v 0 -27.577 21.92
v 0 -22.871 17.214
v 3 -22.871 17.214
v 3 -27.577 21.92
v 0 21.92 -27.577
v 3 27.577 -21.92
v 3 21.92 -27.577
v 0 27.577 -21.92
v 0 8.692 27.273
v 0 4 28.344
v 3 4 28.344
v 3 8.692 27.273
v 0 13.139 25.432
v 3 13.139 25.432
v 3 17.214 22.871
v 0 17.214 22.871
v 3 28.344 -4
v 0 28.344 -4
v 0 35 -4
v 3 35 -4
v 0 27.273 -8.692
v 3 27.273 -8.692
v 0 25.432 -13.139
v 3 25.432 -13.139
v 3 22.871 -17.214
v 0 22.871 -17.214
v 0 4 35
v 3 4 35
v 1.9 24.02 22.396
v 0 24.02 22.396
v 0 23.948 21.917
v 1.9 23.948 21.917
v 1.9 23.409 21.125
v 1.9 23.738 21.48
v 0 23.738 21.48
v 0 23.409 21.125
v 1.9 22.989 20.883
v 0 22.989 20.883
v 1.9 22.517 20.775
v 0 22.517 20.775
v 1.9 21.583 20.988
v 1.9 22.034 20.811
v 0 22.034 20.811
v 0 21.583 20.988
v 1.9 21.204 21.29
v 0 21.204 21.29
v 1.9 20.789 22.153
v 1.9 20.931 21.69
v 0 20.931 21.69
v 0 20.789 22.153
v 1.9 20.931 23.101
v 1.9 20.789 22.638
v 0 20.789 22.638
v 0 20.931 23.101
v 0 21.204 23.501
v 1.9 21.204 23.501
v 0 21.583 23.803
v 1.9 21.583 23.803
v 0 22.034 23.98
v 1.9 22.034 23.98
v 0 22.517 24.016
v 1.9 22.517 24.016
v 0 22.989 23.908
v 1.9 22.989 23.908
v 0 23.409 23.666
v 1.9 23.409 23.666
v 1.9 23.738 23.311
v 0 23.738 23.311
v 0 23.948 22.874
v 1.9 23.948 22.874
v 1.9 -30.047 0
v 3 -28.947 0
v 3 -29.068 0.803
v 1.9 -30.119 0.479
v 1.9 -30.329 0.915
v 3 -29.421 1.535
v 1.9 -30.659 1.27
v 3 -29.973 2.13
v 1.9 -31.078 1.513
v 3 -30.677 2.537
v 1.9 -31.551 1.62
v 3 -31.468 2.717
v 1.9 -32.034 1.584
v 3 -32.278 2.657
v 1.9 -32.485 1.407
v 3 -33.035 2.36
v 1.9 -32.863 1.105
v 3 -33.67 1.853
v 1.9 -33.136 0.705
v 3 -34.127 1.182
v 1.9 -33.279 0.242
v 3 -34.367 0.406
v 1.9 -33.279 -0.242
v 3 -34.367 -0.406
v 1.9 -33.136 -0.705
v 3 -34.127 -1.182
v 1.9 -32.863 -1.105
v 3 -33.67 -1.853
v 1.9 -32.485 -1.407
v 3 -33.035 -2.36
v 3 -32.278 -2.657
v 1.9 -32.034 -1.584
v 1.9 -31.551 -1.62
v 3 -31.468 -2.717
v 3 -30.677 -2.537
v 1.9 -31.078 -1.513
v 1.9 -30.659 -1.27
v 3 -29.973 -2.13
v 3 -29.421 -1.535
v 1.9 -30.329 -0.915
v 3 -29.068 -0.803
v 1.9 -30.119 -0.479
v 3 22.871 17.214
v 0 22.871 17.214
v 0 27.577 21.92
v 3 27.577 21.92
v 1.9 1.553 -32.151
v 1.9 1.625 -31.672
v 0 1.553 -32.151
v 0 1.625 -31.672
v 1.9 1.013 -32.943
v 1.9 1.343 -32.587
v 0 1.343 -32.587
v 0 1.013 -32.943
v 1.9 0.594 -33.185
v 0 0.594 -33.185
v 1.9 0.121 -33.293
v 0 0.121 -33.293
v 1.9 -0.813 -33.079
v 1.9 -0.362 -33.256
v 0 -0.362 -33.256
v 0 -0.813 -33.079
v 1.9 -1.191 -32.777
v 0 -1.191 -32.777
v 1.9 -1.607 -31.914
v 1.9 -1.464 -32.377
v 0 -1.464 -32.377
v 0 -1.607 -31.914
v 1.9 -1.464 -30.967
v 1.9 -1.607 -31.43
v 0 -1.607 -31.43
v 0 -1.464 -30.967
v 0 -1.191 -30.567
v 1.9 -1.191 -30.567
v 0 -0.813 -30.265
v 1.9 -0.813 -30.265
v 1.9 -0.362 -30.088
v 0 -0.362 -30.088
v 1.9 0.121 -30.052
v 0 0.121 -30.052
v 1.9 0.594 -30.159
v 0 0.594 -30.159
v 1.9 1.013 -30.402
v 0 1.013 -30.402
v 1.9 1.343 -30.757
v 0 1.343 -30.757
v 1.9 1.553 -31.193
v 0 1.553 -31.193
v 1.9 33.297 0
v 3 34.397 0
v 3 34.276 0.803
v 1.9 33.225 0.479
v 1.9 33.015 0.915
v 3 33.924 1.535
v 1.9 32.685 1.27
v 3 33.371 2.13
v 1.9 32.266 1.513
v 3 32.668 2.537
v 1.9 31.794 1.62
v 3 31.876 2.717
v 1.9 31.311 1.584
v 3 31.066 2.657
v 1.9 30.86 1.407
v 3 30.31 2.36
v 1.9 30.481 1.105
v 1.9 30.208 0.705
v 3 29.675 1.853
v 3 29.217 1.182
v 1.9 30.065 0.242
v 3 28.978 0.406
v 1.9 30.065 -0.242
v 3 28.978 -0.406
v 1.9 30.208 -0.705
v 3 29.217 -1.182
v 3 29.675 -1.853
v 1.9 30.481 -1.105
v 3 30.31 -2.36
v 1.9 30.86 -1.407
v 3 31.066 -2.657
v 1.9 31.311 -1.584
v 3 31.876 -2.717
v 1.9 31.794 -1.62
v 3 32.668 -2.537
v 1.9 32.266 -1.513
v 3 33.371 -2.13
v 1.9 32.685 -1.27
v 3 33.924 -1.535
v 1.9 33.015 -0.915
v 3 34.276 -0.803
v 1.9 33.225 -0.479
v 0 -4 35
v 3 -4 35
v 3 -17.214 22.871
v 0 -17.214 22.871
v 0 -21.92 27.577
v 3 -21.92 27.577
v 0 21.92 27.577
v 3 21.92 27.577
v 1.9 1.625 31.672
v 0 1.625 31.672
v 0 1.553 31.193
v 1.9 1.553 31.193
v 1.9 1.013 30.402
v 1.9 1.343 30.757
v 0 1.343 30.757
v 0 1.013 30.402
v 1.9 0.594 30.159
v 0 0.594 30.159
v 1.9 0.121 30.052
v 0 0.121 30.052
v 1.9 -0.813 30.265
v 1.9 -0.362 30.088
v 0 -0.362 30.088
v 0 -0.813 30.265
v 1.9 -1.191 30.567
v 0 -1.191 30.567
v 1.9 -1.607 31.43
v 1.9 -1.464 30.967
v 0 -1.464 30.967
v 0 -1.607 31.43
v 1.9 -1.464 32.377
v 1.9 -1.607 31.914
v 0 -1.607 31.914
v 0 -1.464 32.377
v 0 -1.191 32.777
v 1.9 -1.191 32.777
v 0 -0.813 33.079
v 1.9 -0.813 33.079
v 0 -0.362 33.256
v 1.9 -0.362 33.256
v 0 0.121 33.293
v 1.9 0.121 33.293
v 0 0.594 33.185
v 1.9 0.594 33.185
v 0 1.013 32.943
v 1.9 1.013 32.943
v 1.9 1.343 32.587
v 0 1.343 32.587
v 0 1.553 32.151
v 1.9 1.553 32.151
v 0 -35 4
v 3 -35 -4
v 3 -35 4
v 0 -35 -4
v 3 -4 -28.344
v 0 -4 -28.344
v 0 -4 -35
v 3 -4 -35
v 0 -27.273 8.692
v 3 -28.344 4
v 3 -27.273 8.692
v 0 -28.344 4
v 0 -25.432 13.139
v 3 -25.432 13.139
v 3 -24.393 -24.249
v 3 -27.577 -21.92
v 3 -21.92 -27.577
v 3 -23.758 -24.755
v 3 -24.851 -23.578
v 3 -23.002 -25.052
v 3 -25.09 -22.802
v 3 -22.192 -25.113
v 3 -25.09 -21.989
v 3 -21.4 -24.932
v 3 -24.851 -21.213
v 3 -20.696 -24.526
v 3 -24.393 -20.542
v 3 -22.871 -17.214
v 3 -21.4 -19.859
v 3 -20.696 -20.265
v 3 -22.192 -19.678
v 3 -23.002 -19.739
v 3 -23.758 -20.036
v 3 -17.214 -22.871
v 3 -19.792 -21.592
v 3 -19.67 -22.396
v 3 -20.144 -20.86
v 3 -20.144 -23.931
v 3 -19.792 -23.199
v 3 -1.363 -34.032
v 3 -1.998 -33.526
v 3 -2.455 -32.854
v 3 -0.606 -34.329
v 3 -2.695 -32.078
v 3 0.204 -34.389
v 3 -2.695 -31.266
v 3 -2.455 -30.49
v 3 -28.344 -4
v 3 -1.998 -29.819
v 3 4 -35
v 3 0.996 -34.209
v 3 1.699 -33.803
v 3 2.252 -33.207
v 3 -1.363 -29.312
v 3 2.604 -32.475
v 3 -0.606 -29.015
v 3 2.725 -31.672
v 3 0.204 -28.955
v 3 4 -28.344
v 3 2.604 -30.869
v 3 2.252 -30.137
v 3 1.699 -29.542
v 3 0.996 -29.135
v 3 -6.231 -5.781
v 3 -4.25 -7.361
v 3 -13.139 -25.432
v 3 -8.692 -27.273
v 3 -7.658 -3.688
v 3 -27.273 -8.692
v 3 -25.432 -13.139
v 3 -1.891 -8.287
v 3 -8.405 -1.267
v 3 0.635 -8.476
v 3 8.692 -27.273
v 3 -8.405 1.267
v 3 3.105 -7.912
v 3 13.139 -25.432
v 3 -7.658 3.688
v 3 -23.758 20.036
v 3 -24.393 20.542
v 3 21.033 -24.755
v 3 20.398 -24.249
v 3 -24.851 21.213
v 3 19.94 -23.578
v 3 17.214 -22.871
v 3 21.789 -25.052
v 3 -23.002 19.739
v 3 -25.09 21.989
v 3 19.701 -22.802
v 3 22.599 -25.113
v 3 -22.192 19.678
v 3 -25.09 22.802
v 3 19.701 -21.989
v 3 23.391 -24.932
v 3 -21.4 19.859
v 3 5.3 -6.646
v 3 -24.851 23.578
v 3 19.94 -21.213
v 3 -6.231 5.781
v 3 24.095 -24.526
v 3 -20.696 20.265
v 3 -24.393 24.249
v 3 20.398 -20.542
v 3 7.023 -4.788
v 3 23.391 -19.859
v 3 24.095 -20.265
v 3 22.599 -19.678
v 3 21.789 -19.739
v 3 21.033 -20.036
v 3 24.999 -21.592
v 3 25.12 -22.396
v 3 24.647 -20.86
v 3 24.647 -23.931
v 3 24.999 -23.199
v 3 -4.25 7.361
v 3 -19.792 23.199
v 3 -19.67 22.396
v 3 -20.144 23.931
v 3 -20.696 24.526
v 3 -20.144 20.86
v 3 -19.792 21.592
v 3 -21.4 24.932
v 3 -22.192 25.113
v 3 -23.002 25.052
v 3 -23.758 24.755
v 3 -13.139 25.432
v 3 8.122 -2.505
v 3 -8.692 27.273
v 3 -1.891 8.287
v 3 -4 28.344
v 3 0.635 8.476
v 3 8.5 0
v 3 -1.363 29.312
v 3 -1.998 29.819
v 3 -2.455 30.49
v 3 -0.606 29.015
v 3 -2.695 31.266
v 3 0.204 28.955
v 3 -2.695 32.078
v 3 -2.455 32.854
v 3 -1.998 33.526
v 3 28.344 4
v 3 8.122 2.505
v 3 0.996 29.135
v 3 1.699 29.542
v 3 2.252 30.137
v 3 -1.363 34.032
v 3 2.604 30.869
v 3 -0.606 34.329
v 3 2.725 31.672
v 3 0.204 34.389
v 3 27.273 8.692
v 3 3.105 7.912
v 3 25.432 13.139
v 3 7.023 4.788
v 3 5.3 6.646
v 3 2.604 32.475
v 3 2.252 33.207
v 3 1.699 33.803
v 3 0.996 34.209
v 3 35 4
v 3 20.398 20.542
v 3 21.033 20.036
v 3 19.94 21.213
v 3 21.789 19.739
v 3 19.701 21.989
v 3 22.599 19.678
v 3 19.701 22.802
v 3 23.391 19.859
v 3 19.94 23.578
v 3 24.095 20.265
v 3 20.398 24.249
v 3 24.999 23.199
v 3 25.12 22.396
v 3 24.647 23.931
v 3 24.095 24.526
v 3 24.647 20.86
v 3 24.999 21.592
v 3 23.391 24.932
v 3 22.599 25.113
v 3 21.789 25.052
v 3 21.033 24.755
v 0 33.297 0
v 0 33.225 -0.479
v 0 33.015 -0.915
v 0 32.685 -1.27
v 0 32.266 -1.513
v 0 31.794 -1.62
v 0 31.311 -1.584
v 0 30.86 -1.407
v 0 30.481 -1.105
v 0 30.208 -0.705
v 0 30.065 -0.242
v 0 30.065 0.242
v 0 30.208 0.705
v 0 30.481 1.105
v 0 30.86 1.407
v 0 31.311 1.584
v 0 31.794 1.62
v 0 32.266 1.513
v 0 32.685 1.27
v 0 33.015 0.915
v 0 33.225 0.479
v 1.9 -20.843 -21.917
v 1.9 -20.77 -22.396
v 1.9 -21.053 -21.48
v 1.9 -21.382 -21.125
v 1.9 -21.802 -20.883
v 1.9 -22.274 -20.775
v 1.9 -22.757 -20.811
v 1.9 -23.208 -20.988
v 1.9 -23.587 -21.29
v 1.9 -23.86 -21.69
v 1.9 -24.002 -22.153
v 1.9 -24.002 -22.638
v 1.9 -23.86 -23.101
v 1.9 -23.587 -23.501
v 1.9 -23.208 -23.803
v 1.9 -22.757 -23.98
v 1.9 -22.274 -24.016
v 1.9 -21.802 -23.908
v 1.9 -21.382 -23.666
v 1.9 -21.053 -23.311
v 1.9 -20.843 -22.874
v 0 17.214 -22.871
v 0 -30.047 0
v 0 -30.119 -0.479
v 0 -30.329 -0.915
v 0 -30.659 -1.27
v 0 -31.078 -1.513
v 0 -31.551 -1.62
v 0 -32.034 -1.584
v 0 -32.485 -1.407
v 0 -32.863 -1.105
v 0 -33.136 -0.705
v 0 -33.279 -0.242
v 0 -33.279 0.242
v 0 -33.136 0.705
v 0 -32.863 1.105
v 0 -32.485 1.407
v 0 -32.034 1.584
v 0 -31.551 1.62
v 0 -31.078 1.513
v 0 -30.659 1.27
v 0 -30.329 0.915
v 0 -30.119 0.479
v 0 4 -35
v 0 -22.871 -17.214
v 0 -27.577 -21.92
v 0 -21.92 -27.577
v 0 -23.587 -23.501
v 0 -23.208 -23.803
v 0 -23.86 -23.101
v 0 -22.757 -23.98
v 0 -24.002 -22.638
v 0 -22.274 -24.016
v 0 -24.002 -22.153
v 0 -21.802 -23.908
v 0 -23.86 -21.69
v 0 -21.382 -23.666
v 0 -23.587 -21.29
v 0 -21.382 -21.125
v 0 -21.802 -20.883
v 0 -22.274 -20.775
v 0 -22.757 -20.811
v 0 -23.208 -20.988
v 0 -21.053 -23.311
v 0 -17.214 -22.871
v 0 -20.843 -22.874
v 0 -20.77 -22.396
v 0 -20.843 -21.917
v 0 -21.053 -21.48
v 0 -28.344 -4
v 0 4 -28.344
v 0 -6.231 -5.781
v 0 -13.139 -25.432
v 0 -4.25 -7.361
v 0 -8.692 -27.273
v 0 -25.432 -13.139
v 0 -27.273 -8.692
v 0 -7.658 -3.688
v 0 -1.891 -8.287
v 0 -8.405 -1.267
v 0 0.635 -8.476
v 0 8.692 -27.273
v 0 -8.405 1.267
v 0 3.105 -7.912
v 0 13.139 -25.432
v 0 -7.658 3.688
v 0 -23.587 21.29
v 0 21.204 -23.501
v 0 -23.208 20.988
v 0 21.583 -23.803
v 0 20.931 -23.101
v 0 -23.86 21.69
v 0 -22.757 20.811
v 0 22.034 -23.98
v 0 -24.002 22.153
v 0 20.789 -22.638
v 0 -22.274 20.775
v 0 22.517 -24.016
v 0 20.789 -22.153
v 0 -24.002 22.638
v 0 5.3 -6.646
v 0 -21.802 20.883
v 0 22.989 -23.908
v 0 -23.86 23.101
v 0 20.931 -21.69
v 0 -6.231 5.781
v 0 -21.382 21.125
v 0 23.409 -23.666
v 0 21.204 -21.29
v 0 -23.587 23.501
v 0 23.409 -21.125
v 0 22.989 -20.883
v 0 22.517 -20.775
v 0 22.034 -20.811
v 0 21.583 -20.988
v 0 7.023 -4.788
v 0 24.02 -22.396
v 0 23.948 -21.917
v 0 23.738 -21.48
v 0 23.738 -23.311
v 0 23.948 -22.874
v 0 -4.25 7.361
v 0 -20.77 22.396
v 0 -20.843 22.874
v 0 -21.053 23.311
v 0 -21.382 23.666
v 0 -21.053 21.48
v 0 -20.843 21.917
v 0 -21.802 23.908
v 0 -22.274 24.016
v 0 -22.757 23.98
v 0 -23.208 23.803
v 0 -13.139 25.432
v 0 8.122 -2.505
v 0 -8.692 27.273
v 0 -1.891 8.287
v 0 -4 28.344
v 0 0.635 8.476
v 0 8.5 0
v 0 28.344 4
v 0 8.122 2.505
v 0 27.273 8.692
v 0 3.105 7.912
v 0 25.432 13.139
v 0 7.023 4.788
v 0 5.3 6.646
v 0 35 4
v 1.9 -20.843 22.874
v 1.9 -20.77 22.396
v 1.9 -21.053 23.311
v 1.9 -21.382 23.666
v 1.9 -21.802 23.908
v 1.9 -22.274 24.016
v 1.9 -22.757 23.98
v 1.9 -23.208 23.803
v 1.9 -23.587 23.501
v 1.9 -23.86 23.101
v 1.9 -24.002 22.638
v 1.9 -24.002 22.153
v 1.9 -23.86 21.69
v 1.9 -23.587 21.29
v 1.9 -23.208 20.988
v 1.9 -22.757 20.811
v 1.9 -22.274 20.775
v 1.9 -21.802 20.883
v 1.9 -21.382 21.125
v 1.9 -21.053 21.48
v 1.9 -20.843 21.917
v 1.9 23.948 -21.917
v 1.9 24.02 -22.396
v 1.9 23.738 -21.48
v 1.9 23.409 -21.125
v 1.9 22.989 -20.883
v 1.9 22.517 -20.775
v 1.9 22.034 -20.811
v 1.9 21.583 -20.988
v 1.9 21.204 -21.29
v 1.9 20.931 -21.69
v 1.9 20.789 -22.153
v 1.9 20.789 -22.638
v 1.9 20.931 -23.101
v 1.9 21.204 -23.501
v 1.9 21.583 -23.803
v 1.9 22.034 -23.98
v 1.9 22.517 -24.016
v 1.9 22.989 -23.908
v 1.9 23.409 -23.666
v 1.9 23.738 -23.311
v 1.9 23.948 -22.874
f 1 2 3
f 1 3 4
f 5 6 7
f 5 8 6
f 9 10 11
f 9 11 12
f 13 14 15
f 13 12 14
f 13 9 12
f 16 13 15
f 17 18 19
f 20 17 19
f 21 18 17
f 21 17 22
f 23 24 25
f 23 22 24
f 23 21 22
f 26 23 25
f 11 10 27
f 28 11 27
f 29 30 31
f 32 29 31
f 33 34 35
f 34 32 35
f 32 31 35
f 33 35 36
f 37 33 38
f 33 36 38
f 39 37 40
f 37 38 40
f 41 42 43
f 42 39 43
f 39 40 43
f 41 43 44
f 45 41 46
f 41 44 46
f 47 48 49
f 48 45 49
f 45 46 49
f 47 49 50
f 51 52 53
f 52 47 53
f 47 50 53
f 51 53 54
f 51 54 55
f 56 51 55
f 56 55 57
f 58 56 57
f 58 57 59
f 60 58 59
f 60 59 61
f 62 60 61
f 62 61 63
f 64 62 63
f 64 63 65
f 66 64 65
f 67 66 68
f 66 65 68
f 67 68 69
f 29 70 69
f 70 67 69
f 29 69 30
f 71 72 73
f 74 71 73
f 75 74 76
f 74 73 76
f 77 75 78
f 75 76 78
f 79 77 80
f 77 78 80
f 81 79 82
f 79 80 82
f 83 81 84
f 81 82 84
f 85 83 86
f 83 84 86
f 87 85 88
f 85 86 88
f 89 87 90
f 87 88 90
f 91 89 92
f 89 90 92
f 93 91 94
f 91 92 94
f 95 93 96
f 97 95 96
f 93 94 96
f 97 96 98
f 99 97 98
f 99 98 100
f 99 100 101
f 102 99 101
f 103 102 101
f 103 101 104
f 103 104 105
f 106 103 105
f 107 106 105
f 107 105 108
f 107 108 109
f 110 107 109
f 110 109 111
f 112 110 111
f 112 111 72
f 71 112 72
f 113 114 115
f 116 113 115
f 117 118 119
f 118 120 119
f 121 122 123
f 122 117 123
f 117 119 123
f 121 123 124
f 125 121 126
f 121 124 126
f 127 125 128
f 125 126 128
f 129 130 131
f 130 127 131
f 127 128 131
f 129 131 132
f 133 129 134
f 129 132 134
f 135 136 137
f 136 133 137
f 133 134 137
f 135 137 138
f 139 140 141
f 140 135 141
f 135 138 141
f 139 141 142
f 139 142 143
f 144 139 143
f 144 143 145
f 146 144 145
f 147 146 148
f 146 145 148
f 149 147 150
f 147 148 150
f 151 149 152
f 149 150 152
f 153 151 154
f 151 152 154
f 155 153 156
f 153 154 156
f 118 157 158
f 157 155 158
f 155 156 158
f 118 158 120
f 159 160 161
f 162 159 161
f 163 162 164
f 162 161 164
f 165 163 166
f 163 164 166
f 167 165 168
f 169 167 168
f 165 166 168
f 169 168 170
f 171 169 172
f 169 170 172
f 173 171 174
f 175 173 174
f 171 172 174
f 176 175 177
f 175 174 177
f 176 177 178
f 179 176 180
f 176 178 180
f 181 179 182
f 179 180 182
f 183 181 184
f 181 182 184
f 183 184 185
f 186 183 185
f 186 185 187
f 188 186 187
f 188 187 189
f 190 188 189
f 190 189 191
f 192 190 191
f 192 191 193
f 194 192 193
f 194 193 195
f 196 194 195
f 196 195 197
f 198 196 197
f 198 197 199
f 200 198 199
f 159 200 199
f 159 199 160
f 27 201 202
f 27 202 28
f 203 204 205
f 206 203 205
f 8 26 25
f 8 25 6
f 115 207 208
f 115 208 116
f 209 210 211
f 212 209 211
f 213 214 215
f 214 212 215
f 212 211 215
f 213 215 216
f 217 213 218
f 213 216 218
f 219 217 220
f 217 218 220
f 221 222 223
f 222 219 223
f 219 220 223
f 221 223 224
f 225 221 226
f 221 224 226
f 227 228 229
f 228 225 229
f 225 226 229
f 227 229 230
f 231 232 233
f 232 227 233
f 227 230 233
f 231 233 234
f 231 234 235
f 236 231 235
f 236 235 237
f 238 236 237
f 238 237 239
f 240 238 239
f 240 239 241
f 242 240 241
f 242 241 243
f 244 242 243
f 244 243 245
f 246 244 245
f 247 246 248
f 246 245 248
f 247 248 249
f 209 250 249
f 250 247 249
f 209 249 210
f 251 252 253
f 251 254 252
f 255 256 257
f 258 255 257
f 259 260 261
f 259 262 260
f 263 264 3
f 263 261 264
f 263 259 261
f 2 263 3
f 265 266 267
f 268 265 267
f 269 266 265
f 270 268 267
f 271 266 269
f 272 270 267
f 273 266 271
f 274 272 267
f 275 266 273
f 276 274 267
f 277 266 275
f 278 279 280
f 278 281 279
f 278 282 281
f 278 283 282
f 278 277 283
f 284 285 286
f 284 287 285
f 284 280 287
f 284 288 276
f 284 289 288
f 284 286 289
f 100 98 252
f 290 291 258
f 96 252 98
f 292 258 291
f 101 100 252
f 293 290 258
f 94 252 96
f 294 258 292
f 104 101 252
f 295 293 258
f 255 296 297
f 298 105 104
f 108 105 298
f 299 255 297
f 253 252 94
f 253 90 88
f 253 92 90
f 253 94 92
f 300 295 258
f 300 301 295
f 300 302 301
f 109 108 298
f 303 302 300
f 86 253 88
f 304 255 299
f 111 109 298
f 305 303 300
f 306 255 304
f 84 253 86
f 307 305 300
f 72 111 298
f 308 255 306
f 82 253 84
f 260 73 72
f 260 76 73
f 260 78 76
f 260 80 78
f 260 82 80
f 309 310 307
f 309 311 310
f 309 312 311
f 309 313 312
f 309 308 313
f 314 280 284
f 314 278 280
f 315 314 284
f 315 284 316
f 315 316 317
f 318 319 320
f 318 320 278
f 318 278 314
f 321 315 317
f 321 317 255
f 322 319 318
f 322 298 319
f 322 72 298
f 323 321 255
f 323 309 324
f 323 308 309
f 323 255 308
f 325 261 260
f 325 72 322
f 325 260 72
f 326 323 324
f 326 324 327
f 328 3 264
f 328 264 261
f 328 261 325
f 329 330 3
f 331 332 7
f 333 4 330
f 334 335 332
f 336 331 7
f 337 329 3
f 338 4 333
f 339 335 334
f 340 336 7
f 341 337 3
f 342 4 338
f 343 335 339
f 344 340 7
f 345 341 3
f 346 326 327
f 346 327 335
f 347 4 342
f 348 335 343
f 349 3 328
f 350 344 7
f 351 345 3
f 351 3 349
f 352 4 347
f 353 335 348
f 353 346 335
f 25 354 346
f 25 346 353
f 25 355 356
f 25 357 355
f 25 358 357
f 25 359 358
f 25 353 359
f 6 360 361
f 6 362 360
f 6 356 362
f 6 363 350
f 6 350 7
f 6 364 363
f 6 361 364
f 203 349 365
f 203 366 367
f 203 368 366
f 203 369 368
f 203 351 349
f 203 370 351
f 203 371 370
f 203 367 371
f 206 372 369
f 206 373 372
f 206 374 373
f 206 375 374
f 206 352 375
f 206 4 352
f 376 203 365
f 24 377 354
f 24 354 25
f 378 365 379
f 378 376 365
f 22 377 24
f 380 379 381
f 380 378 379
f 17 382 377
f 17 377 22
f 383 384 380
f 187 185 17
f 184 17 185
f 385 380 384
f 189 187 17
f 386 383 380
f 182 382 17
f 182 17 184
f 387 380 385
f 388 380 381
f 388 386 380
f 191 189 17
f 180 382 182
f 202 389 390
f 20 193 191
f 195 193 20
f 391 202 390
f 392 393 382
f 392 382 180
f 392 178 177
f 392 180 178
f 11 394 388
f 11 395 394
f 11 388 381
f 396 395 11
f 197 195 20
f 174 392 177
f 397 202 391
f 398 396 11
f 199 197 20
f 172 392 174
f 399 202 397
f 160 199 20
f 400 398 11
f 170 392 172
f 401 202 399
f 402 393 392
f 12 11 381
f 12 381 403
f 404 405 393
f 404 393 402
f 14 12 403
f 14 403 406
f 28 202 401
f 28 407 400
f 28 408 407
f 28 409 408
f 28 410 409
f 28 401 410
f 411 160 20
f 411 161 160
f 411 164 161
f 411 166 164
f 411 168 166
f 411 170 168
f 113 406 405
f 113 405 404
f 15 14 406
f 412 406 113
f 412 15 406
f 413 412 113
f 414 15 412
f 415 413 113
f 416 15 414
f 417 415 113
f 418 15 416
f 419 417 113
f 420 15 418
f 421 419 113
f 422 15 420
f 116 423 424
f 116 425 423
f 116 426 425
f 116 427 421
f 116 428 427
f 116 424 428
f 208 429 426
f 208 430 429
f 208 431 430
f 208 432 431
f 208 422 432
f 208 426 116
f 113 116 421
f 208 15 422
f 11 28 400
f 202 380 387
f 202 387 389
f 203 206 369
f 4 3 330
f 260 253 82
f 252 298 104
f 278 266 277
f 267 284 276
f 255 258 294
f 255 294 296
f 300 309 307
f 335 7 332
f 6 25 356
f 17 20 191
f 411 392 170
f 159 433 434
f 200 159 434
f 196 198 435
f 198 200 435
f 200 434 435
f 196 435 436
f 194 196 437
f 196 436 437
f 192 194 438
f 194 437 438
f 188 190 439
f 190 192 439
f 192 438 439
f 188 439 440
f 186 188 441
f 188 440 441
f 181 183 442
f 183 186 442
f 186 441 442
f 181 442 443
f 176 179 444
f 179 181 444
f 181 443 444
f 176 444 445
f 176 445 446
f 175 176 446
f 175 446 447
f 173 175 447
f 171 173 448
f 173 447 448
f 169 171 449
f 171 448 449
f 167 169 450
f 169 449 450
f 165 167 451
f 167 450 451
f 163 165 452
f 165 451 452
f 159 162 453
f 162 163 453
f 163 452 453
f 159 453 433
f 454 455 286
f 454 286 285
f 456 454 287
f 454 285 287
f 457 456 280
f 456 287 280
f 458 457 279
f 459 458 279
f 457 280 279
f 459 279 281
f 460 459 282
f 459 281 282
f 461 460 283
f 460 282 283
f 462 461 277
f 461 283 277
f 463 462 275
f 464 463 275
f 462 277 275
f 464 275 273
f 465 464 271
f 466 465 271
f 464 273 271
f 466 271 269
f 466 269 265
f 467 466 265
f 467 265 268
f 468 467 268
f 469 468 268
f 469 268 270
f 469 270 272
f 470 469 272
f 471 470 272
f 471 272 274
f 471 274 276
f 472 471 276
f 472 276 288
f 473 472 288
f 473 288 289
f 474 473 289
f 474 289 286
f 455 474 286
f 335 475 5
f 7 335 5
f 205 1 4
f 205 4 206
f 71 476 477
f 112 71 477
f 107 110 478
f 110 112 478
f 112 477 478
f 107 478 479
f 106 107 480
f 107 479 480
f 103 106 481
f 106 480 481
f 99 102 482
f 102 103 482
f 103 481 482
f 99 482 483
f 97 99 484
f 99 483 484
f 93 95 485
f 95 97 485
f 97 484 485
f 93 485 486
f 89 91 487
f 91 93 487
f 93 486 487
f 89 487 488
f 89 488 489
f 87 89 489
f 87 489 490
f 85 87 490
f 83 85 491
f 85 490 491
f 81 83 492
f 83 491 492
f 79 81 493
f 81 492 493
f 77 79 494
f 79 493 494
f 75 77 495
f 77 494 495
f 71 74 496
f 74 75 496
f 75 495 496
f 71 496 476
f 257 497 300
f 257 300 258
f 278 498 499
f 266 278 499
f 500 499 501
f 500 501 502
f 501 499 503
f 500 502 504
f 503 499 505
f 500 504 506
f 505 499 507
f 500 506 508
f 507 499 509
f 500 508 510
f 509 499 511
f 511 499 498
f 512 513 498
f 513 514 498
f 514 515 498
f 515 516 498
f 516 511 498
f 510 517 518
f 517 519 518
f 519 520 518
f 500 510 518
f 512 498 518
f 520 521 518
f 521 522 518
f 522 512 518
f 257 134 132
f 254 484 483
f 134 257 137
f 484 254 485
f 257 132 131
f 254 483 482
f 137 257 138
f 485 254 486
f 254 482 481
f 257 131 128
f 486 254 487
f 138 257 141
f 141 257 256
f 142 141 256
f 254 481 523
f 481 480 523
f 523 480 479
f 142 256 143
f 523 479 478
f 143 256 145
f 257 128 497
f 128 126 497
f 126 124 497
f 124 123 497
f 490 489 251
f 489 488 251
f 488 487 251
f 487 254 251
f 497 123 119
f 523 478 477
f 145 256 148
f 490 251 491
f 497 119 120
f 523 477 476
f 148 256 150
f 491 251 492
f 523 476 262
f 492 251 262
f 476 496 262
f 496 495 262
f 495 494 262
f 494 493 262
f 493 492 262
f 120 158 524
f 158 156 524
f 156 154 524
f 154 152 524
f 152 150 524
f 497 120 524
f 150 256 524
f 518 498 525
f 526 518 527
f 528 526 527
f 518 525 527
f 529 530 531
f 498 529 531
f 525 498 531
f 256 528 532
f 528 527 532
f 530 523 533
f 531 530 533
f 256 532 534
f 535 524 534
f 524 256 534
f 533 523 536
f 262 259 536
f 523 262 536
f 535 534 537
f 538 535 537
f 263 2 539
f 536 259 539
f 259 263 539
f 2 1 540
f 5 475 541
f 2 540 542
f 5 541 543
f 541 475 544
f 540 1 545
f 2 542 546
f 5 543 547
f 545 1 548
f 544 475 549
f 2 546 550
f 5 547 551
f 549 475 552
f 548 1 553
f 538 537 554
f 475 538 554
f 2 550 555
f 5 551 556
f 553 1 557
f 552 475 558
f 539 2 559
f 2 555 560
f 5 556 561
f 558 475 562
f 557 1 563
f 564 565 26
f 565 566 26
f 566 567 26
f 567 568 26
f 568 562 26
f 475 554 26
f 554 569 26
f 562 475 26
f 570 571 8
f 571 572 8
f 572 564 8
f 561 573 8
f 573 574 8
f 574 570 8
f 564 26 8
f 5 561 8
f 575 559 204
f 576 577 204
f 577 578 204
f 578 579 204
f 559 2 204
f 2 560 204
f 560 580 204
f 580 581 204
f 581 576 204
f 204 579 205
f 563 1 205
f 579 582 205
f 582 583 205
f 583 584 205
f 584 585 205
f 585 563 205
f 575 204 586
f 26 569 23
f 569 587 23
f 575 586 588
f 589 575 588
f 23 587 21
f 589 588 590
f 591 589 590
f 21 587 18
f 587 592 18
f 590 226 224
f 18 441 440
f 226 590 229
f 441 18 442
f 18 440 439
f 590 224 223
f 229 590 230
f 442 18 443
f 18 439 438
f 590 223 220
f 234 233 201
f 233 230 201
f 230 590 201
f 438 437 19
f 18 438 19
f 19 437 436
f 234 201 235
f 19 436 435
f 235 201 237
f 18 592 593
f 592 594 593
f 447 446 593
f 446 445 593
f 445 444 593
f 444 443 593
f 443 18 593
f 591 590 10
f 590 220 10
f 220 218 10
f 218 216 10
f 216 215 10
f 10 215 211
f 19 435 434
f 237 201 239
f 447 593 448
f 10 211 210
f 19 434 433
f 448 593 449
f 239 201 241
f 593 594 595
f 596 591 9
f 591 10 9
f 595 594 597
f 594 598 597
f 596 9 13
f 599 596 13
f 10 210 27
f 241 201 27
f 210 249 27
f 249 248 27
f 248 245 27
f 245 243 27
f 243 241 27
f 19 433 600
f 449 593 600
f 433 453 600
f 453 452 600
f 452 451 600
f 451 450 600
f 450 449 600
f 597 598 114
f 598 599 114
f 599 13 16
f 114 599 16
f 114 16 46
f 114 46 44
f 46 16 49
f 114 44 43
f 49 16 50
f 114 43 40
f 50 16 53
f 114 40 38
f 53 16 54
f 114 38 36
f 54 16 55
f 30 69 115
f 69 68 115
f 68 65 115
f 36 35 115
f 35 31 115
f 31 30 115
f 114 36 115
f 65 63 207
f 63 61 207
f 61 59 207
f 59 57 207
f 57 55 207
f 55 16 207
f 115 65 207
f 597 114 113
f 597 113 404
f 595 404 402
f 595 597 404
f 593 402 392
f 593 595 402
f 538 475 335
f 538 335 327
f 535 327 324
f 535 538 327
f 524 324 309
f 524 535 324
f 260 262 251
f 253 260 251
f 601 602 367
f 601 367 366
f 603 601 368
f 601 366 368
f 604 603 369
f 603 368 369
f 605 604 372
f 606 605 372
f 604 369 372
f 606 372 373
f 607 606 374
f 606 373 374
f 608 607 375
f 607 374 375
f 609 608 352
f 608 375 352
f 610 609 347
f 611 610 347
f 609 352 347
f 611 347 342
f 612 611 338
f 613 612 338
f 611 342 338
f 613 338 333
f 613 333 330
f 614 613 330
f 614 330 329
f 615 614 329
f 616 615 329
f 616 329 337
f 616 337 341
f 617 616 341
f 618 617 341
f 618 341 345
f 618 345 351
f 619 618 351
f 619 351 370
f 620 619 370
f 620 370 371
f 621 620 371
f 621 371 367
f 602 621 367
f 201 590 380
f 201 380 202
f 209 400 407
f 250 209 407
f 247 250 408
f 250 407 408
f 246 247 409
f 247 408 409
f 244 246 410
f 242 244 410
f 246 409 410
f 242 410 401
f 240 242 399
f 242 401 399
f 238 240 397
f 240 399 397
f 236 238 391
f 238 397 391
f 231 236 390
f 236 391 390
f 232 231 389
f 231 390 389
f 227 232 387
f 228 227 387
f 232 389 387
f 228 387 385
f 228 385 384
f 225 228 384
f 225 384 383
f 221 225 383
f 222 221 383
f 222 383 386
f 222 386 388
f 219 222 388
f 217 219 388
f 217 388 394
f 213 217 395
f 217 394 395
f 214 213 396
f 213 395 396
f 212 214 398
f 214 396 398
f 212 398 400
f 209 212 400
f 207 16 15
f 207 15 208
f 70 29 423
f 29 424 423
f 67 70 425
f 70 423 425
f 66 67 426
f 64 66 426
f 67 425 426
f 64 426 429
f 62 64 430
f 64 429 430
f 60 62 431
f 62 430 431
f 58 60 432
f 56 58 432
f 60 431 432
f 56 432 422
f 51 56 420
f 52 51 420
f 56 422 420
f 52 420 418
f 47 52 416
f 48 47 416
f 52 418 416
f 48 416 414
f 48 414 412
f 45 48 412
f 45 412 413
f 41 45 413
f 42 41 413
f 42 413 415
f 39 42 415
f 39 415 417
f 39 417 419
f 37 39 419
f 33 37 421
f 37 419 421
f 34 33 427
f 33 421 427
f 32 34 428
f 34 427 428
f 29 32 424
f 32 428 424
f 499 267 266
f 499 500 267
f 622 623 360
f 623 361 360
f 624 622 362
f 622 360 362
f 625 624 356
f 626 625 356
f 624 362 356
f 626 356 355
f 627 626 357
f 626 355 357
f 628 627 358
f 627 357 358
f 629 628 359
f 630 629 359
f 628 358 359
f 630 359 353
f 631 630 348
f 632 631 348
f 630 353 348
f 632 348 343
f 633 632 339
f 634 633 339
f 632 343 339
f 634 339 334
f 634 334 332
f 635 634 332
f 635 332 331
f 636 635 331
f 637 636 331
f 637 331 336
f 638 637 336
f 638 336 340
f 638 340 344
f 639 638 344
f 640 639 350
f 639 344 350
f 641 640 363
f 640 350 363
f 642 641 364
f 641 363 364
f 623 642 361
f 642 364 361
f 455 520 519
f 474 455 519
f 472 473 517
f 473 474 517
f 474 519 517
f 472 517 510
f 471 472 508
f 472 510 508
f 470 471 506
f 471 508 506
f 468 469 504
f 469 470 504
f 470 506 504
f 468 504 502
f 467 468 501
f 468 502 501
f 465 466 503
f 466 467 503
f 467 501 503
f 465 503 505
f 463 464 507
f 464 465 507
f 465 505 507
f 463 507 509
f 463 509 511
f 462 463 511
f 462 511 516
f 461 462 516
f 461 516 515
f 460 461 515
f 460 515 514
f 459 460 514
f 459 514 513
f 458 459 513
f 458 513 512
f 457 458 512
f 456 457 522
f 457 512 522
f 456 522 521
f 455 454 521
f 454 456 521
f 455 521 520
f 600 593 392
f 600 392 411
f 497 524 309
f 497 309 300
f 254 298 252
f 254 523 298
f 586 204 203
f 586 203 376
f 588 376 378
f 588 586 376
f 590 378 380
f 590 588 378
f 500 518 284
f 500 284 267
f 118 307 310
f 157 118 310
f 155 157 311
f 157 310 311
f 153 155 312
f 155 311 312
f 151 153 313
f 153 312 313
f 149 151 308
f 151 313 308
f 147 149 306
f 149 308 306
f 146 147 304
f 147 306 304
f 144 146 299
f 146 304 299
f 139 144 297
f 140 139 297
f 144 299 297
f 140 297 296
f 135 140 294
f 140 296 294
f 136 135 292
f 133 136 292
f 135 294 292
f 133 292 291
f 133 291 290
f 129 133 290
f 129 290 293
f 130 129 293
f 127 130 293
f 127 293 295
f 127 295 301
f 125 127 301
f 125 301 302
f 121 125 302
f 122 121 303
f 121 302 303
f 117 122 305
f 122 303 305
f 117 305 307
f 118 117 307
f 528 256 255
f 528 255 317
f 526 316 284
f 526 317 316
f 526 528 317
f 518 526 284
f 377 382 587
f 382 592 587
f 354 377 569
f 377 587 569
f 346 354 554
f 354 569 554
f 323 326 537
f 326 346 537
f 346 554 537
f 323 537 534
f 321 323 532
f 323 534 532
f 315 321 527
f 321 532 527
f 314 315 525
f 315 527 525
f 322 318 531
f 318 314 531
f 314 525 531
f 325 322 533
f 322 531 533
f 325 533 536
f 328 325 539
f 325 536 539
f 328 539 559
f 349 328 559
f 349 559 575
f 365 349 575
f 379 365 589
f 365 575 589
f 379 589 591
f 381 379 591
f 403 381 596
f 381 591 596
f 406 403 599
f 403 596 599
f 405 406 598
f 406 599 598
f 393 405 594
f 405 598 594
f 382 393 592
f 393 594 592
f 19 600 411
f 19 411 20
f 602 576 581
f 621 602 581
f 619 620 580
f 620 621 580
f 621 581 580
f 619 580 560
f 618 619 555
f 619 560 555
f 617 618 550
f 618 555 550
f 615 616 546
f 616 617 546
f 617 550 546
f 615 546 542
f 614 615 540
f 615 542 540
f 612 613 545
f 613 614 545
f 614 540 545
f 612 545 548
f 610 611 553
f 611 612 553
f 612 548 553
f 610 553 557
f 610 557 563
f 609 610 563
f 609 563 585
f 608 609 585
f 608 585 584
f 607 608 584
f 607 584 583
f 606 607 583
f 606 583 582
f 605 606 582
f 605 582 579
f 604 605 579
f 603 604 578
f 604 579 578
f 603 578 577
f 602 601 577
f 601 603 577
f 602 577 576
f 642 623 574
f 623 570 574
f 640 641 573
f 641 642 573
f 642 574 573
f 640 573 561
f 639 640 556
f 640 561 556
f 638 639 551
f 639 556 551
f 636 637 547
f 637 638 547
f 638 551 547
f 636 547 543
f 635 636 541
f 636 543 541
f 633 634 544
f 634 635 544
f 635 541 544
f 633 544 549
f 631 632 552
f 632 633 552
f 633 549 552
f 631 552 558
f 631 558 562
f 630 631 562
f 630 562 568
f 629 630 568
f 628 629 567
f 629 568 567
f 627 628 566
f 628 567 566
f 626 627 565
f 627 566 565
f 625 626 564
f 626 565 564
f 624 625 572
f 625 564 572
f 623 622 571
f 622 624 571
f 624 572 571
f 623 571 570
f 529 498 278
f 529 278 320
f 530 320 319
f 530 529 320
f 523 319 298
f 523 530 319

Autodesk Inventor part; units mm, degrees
ref_plane "YZ Plane" through (0, 0, 0) normal (1, 0, 0) x (0, 1, 0)
ref_plane "XZ Plane" through (0, 0, 0) normal (0, 1, 0) x (-1, 0, 0)
ref_plane "XY Plane" through (0, 0, 0) normal (0, 0, 1) x (1, 0, 0)
sketch "Sketch1" plane through (0, 0, 0) normal (1, 0, 0) x (0, 1, 0)
  circle A0 centre (0, 0) radius 8.5
  line L0 (28.3441, -4) -> (35, -4)
  line L1 (35, 4) -> (35, -4)
  line L2 (28.3441, 4) -> (35, 4)
  circle A1 centre (31.6721, 0) radius 1.625
  line L3 (17.2139, 22.8708) -> (21.9203, 27.5772)
  line L4 (21.9203, 27.5772) -> (27.5772, 21.9203)
  circle A2 centre (22.3955, 22.3955) radius 1.625
  line L5 (22.8708, 17.2139) -> (27.5772, 21.9203)
  line L6 (-4, 28.3441) -> (-4, 35)
  line L7 (-4, 35) -> (4, 35)
  circle A3 centre (0, 31.6721) radius 1.625
  line L8 (4, 28.3441) -> (4, 35)
  line L9 (-22.8708, 17.2139) -> (-27.5772, 21.9203)
  line L10 (-27.5772, 21.9203) -> (-21.9203, 27.5772)
  circle A4 centre (-22.3955, 22.3955) radius 1.625
  line L11 (-17.2139, 22.8708) -> (-21.9203, 27.5772)
  line L12 (-28.3441, -4) -> (-35, -4)
  line L13 (-35, -4) -> (-35, 4)
  circle A5 centre (-31.6721, 0) radius 1.625
  line L14 (-28.3441, 4) -> (-35, 4)
  line L15 (-17.2139, -22.8708) -> (-21.9203, -27.5772)
  line L16 (-21.9203, -27.5772) -> (-27.5772, -21.9203)
  circle A6 centre (-22.3955, -22.3955) radius 1.625
  line L17 (-22.8708, -17.2139) -> (-27.5772, -21.9203)
  line L18 (4, -28.3441) -> (4, -35)
  line L19 (4, -35) -> (-4, -35)
  circle A7 centre (0, -31.6721) radius 1.625
  line L20 (-4, -28.3441) -> (-4, -35)
  line L21 (22.8708, -17.2139) -> (27.5772, -21.9203)
  line L22 (27.5772, -21.9203) -> (21.9203, -27.5772)
  circle A8 centre (22.3955, -22.3955) radius 1.625
  line L23 (17.2139, -22.8708) -> (21.9203, -27.5772)
  arc A9 (22.8708, -17.2139) -> (28.3441, -4) centre (0, 0) ccw
  arc A10 (4, -28.3441) -> (17.2139, -22.8708) centre (0, 0) ccw
  arc A11 (-17.2139, -22.8708) -> (-4, -28.3441) centre (0, 0) ccw
  arc A12 (-28.3441, -4) -> (-22.8708, -17.2139) centre (0, 0) ccw
  arc A13 (-22.8708, 17.2139) -> (-28.3441, 4) centre (0, 0) ccw
  arc A14 (-4, 28.3441) -> (-17.2139, 22.8708) centre (0, 0) ccw
  arc A15 (28.3441, 4) -> (22.8708, 17.2139) centre (0, 0) ccw
  arc A16 (17.2139, 22.8708) -> (4, 28.3441) centre (0, 0) ccw
  dimension "d0" = 17
  dimension "d8" = 360
  dimension "d12" = 3.25
extrude "Extrusion1" add sketch "Sketch1" along normal blind 3
sketch "Sketch2" plane through (3, 0, 0) normal (1, 0, 0) x (0, 0, -1)
  line L0 (-5.2542, 23.7941) -> (-5.2542, 26.8421)
  line L1 (-5.2542, 26.8421) -> (-2.9174, 26.8421)
  line L2 (-2.9174, 26.8421) -> (-2.9174, 26.5373)
  line L3 (-2.9174, 26.5373) -> (-4.9494, 26.5373)
  line L4 (-4.9494, 26.5373) -> (-4.9494, 25.5721)
  line L5 (-4.9494, 25.5721) -> (-2.9174, 25.5721)
  line L6 (-2.9174, 25.5721) -> (-2.9174, 25.2673)
  line L7 (-2.9174, 25.2673) -> (-4.9494, 25.2673)
  line L8 (-4.9494, 25.2673) -> (-4.9494, 23.7941)
  line L9 (-4.9494, 23.7941) -> (-5.2542, 23.7941)
  line L10 (-5.2034, 23.8449) -> (-5.2034, 26.7913)
  line L11 (-5.2034, 26.7913) -> (-2.9682, 26.7913)
  line L12 (-2.9682, 26.7913) -> (-2.9682, 26.5881)
  line L13 (-2.9682, 26.5881) -> (-5.0002, 26.5881)
  line L14 (-5.0002, 26.5881) -> (-5.0002, 25.5213)
  line L15 (-5.0002, 25.5213) -> (-2.9682, 25.5213)
  line L16 (-2.9682, 25.5213) -> (-2.9682, 25.3181)
  line L17 (-2.9682, 25.3181) -> (-5.0002, 25.3181)
  line L18 (-5.0002, 25.3181) -> (-5.0002, 23.8449)
  line L19 (-5.0002, 23.8449) -> (-5.2034, 23.8449)
  line L20 (-5.1526, 23.8957) -> (-5.1526, 26.7405)
  line L21 (-5.1526, 26.7405) -> (-3.019, 26.7405)
  line L22 (-3.019, 26.7405) -> (-3.019, 26.6389)
  line L23 (-3.019, 26.6389) -> (-5.051, 26.6389)
  line L24 (-5.051, 26.6389) -> (-5.051, 25.4705)
  line L25 (-5.051, 25.4705) -> (-3.019, 25.4705)
  line L26 (-3.019, 25.4705) -> (-3.019, 25.3689)
  line L27 (-3.019, 25.3689) -> (-5.051, 25.3689)
  line L28 (-5.051, 25.3689) -> (-5.051, 23.8957)
  line L29 (-5.051, 23.8957) -> (-5.1526, 23.8957)
  line L30 (-5.1018, 23.9465) -> (-5.1018, 26.6897)
  line L31 (-5.1018, 26.6897) -> (-3.0698, 26.6897)
  line L32 (-3.0698, 25.4197) -> (-5.1018, 25.4197)
  line L33 (-2.511, 23.7941) -> (-2.511, 26.0293)
  line L34 (-2.511, 26.0293) -> (-2.2062, 26.0293)
  line L35 (-2.2062, 26.0293) -> (-2.2062, 25.6737)
  arc A0 (-1.3889, 26.0291) -> (-2.2062, 25.6737) centre (-1.3889, 24.9115) ccw
  line L36 (-1.3889, 26.0291) -> (-1.0841, 26.0291)
  line L37 (-1.0841, 26.0291) -> (-1.0841, 25.7243)
  line L38 (-1.0841, 25.7243) -> (-1.3889, 25.7243)
  arc A1 (-1.3889, 25.7243) -> (-2.2017, 24.9115) centre (-1.3889, 24.9115) ccw
  line L39 (-2.2017, 24.9115) -> (-2.2017, 23.7939)
  line L40 (-2.2017, 23.7939) -> (-2.5065, 23.7939)
  line L41 (-2.4557, 23.8447) -> (-2.4557, 24.9115)
  arc A2 (-1.3889, 25.9783) -> (-2.4557, 24.9115) centre (-1.3889, 24.9115) ccw
  line L42 (-1.3889, 25.9783) -> (-1.1349, 25.9783)
  line L43 (-1.1349, 25.9783) -> (-1.1349, 25.7751)
  line L44 (-1.1349, 25.7751) -> (-1.3889, 25.7751)
  arc A3 (-1.3889, 25.7751) -> (-2.2525, 24.9115) centre (-1.3889, 24.9115) ccw
  line L45 (-2.2525, 24.9115) -> (-2.2525, 23.8447)
  line L46 (-2.2525, 23.8447) -> (-2.4557, 23.8447)
  line L47 (-2.4049, 23.8955) -> (-2.4049, 24.9115)
  arc A4 (-1.3889, 25.9275) -> (-2.4049, 24.9115) centre (-1.3889, 24.9115) ccw
  line L48 (-1.3889, 25.9275) -> (-1.1857, 25.9275)
  line L49 (-1.1857, 25.9275) -> (-1.1857, 25.8259)
  line L50 (-1.1857, 25.8259) -> (-1.3889, 25.8259)
  arc A5 (-1.3889, 25.8259) -> (-2.3033, 24.9115) centre (-1.3889, 24.9115) ccw
  line L51 (-2.3033, 24.9115) -> (-2.3033, 23.8955)
  line L52 (-2.3033, 23.8955) -> (-2.4049, 23.8955)
  line L53 (-2.3541, 23.9463) -> (-2.3541, 24.9115)
  arc A6 (-1.3889, 25.8767) -> (-2.3541, 24.9115) centre (-1.3889, 24.9115) ccw
  line L54 (-1.3889, 25.8767) -> (-1.2365, 25.8767)
  line L55 (-2.4557, 24.9115) -> (-2.4557, 25.9783)
  line L56 (-2.4557, 25.9783) -> (-2.2525, 25.9783)
  line L57 (-2.2525, 25.9783) -> (-2.2525, 25.5211)
  line L58 (-2.3033, 25.4703) -> (-2.3033, 25.9275)
  line L59 (-2.3033, 25.9275) -> (-2.4049, 25.9275)
  line L60 (-2.4049, 25.9275) -> (-2.4049, 25.2163)
  line L61 (-2.3541, 25.3687) -> (-2.3541, 25.8767)
  circle A7 centre (0.4399, 24.9115) radius 1.1176
  circle A8 centre (0.4399, 24.9115) radius 0.8128
  circle A9 centre (0.4399, 24.9115) radius 0.8636
  circle A10 centre (0.4399, 24.9115) radius 0.9144
  circle A11 centre (0.4399, 24.9115) radius 0.9652
  circle A12 centre (0.4399, 24.9115) radius 1.016
  circle A13 centre (0.4399, 24.9115) radius 1.0668
  line L62 (1.9639, 23.7939) -> (1.9639, 26.0291)
  line L63 (1.9639, 26.0291) -> (2.2687, 26.0291)
  line L64 (2.2687, 26.0291) -> (2.2687, 25.8005)
  arc A14 (3.795, 25.121) -> (2.2687, 25.8005) centre (2.8806, 25.121) ccw
  line L65 (3.795, 25.121) -> (3.795, 23.8002)
  line L66 (3.795, 23.8002) -> (3.4902, 23.8002)
  line L67 (3.4902, 23.8002) -> (3.4902, 25.121)
  arc A15 (3.4902, 25.121) -> (2.271, 25.121) centre (2.8806, 25.121) ccw
  line L68 (2.271, 25.121) -> (2.271, 23.8002)
  line L69 (2.271, 23.8002) -> (1.9662, 23.8002)
  line L70 (2.017, 23.851) -> (2.017, 25.121)
  arc A16 (3.7442, 25.121) -> (2.017, 25.121) centre (2.8806, 25.121) ccw
  line L71 (3.7442, 25.121) -> (3.7442, 23.851)
  line L72 (3.7442, 23.851) -> (3.541, 23.851)
  line L73 (3.541, 23.851) -> (3.541, 25.121)
  arc A17 (3.541, 25.121) -> (2.2202, 25.121) centre (2.8806, 25.121) ccw
  line L74 (2.2202, 25.121) -> (2.2202, 23.851)
  line L75 (2.2202, 23.851) -> (2.017, 23.851)
  line L76 (2.0678, 23.9018) -> (2.0678, 25.121)
  arc A18 (3.6934, 25.121) -> (2.0678, 25.121) centre (2.8806, 25.121) ccw
  line L77 (3.6934, 25.121) -> (3.6934, 23.9018)
  line L78 (3.6934, 23.9018) -> (3.5918, 23.9018)
  line L79 (3.5918, 23.9018) -> (3.5918, 25.121)
  arc A19 (3.5918, 25.121) -> (2.1694, 25.121) centre (2.8806, 25.121) ccw
  line L80 (2.1694, 25.121) -> (2.1694, 23.9018)
  line L81 (2.1694, 23.9018) -> (2.0678, 23.9018)
  line L82 (2.1186, 23.9526) -> (2.1186, 25.121)
  arc A20 (3.6426, 25.121) -> (2.1186, 25.121) centre (2.8806, 25.121) ccw
  line L83 (3.6426, 25.121) -> (3.6426, 23.9526)
  line L84 (2.017, 25.121) -> (2.017, 25.9846)
  line L85 (2.017, 25.9846) -> (2.2202, 25.9846)
  line L86 (2.2202, 25.9846) -> (2.2202, 25.6798)
  line L87 (2.1694, 25.629) -> (2.1694, 25.9338)
  line L88 (2.1694, 25.9338) -> (2.0678, 25.9338)
  line L89 (2.0678, 25.9338) -> (2.0678, 25.375)
  line L90 (2.1186, 25.5274) -> (2.1186, 25.883)
  arc A21 (4.4554, 24.2066) -> (4.8618, 23.8002) centre (4.8618, 24.2066) ccw
  line L91 (4.4554, 24.2066) -> (4.4554, 25.7306)
  line L92 (4.4554, 25.7306) -> (4.1506, 25.7306)
  line L93 (4.1506, 25.7306) -> (4.1506, 26.0354)
  line L94 (4.1506, 26.0354) -> (4.4554, 26.0354)
  line L95 (4.4554, 26.0354) -> (4.4554, 26.8482)
  line L96 (4.4554, 26.8482) -> (4.7602, 26.8482)
  line L97 (4.7602, 26.8482) -> (4.7602, 26.0354)
  line L98 (4.7602, 26.0354) -> (5.065, 26.0354)
  line L99 (5.065, 26.0354) -> (5.065, 25.7306)
  line L100 (5.065, 25.7306) -> (4.7602, 25.7306)
  line L101 (4.7602, 25.7306) -> (4.7602, 24.2066)
  arc A22 (4.7602, 24.2066) -> (4.8618, 24.105) centre (4.8618, 24.2066) ccw
  line L102 (4.8618, 24.105) -> (5.065, 24.105)
  line L103 (5.065, 24.105) -> (5.065, 23.8002)
  line L104 (5.065, 23.8002) -> (4.8618, 23.8002)
  arc A23 (4.5062, 24.2066) -> (4.8618, 23.851) centre (4.8618, 24.2066) ccw
  line L105 (4.5062, 24.2066) -> (4.5062, 25.7814)
  line L106 (4.5062, 25.7814) -> (4.2014, 25.7814)
  line L107 (4.2014, 25.7814) -> (4.2014, 25.9846)
  line L108 (4.2014, 25.9846) -> (4.5062, 25.9846)
  line L109 (4.5062, 25.9846) -> (4.5062, 26.7974)
  line L110 (4.5062, 26.7974) -> (4.7094, 26.7974)
  line L111 (4.7094, 26.7974) -> (4.7094, 25.9846)
  line L112 (4.7094, 25.9846) -> (5.0142, 25.9846)
  line L113 (5.0142, 25.9846) -> (5.0142, 25.7814)
  line L114 (5.0142, 25.7814) -> (4.7094, 25.7814)
  line L115 (4.7094, 25.7814) -> (4.7094, 24.2066)
  arc A24 (4.7094, 24.2066) -> (4.8618, 24.0542) centre (4.8618, 24.2066) ccw
  line L116 (4.8618, 24.0542) -> (5.0142, 24.0542)
  line L117 (5.0142, 24.0542) -> (5.0142, 23.851)
  line L118 (5.0142, 23.851) -> (4.8618, 23.851)
  arc A25 (4.557, 24.2066) -> (4.8618, 23.9018) centre (4.8618, 24.2066) ccw
  line L119 (4.557, 24.2066) -> (4.557, 25.8322)
  line L120 (4.557, 25.8322) -> (4.2522, 25.8322)
  line L121 (4.2522, 25.8322) -> (4.2522, 25.9338)
  line L122 (4.2522, 25.9338) -> (4.557, 25.9338)
  line L123 (4.557, 25.9338) -> (4.557, 26.7466)
  line L124 (4.557, 26.7466) -> (4.6586, 26.7466)
  line L125 (4.6586, 26.7466) -> (4.6586, 25.9338)
  line L126 (4.6586, 25.9338) -> (4.9634, 25.9338)
  line L127 (4.9634, 25.9338) -> (4.9634, 25.8322)
  line L128 (4.9634, 25.8322) -> (4.6586, 25.8322)
  line L129 (4.6586, 25.8322) -> (4.6586, 24.2066)
  arc A26 (4.6586, 24.2066) -> (4.8618, 24.0034) centre (4.8618, 24.2066) ccw
  line L130 (4.8618, 24.0034) -> (4.9634, 24.0034)
  line L131 (4.9634, 24.0034) -> (4.9634, 23.9018)
  line L132 (4.9634, 23.9018) -> (4.8618, 23.9018)
  line L133 (4.9126, 23.9526) -> (4.8618, 23.9526)
  arc A27 (4.6078, 24.2066) -> (4.8618, 23.9526) centre (4.8618, 24.2066) ccw
  line L134 (4.6078, 24.2066) -> (4.6078, 26.6958)
  line L135 (4.303, 25.883) -> (4.9126, 25.883)
  point P0 (0, 0)
  point P1 (-2.2525, 25.5378)
extrude "Extrusion2" [suppressed]
chamfer "Chamfer1" distance 1.1 angle 45 8 edges at (3, 30.0471, 0) (3, 20.7705, -22.3955) (3, -1.625, -31.6721) (3, -24.0205, -22.3955) (3, -33.2971, 0) (3, -24.0205, 22.3955) (3, -1.625, 31.6721) (3, 20.7705, 22.3955)
properties part number "Gear_Box_Chasis_Divider" material "ABS Plastic"
